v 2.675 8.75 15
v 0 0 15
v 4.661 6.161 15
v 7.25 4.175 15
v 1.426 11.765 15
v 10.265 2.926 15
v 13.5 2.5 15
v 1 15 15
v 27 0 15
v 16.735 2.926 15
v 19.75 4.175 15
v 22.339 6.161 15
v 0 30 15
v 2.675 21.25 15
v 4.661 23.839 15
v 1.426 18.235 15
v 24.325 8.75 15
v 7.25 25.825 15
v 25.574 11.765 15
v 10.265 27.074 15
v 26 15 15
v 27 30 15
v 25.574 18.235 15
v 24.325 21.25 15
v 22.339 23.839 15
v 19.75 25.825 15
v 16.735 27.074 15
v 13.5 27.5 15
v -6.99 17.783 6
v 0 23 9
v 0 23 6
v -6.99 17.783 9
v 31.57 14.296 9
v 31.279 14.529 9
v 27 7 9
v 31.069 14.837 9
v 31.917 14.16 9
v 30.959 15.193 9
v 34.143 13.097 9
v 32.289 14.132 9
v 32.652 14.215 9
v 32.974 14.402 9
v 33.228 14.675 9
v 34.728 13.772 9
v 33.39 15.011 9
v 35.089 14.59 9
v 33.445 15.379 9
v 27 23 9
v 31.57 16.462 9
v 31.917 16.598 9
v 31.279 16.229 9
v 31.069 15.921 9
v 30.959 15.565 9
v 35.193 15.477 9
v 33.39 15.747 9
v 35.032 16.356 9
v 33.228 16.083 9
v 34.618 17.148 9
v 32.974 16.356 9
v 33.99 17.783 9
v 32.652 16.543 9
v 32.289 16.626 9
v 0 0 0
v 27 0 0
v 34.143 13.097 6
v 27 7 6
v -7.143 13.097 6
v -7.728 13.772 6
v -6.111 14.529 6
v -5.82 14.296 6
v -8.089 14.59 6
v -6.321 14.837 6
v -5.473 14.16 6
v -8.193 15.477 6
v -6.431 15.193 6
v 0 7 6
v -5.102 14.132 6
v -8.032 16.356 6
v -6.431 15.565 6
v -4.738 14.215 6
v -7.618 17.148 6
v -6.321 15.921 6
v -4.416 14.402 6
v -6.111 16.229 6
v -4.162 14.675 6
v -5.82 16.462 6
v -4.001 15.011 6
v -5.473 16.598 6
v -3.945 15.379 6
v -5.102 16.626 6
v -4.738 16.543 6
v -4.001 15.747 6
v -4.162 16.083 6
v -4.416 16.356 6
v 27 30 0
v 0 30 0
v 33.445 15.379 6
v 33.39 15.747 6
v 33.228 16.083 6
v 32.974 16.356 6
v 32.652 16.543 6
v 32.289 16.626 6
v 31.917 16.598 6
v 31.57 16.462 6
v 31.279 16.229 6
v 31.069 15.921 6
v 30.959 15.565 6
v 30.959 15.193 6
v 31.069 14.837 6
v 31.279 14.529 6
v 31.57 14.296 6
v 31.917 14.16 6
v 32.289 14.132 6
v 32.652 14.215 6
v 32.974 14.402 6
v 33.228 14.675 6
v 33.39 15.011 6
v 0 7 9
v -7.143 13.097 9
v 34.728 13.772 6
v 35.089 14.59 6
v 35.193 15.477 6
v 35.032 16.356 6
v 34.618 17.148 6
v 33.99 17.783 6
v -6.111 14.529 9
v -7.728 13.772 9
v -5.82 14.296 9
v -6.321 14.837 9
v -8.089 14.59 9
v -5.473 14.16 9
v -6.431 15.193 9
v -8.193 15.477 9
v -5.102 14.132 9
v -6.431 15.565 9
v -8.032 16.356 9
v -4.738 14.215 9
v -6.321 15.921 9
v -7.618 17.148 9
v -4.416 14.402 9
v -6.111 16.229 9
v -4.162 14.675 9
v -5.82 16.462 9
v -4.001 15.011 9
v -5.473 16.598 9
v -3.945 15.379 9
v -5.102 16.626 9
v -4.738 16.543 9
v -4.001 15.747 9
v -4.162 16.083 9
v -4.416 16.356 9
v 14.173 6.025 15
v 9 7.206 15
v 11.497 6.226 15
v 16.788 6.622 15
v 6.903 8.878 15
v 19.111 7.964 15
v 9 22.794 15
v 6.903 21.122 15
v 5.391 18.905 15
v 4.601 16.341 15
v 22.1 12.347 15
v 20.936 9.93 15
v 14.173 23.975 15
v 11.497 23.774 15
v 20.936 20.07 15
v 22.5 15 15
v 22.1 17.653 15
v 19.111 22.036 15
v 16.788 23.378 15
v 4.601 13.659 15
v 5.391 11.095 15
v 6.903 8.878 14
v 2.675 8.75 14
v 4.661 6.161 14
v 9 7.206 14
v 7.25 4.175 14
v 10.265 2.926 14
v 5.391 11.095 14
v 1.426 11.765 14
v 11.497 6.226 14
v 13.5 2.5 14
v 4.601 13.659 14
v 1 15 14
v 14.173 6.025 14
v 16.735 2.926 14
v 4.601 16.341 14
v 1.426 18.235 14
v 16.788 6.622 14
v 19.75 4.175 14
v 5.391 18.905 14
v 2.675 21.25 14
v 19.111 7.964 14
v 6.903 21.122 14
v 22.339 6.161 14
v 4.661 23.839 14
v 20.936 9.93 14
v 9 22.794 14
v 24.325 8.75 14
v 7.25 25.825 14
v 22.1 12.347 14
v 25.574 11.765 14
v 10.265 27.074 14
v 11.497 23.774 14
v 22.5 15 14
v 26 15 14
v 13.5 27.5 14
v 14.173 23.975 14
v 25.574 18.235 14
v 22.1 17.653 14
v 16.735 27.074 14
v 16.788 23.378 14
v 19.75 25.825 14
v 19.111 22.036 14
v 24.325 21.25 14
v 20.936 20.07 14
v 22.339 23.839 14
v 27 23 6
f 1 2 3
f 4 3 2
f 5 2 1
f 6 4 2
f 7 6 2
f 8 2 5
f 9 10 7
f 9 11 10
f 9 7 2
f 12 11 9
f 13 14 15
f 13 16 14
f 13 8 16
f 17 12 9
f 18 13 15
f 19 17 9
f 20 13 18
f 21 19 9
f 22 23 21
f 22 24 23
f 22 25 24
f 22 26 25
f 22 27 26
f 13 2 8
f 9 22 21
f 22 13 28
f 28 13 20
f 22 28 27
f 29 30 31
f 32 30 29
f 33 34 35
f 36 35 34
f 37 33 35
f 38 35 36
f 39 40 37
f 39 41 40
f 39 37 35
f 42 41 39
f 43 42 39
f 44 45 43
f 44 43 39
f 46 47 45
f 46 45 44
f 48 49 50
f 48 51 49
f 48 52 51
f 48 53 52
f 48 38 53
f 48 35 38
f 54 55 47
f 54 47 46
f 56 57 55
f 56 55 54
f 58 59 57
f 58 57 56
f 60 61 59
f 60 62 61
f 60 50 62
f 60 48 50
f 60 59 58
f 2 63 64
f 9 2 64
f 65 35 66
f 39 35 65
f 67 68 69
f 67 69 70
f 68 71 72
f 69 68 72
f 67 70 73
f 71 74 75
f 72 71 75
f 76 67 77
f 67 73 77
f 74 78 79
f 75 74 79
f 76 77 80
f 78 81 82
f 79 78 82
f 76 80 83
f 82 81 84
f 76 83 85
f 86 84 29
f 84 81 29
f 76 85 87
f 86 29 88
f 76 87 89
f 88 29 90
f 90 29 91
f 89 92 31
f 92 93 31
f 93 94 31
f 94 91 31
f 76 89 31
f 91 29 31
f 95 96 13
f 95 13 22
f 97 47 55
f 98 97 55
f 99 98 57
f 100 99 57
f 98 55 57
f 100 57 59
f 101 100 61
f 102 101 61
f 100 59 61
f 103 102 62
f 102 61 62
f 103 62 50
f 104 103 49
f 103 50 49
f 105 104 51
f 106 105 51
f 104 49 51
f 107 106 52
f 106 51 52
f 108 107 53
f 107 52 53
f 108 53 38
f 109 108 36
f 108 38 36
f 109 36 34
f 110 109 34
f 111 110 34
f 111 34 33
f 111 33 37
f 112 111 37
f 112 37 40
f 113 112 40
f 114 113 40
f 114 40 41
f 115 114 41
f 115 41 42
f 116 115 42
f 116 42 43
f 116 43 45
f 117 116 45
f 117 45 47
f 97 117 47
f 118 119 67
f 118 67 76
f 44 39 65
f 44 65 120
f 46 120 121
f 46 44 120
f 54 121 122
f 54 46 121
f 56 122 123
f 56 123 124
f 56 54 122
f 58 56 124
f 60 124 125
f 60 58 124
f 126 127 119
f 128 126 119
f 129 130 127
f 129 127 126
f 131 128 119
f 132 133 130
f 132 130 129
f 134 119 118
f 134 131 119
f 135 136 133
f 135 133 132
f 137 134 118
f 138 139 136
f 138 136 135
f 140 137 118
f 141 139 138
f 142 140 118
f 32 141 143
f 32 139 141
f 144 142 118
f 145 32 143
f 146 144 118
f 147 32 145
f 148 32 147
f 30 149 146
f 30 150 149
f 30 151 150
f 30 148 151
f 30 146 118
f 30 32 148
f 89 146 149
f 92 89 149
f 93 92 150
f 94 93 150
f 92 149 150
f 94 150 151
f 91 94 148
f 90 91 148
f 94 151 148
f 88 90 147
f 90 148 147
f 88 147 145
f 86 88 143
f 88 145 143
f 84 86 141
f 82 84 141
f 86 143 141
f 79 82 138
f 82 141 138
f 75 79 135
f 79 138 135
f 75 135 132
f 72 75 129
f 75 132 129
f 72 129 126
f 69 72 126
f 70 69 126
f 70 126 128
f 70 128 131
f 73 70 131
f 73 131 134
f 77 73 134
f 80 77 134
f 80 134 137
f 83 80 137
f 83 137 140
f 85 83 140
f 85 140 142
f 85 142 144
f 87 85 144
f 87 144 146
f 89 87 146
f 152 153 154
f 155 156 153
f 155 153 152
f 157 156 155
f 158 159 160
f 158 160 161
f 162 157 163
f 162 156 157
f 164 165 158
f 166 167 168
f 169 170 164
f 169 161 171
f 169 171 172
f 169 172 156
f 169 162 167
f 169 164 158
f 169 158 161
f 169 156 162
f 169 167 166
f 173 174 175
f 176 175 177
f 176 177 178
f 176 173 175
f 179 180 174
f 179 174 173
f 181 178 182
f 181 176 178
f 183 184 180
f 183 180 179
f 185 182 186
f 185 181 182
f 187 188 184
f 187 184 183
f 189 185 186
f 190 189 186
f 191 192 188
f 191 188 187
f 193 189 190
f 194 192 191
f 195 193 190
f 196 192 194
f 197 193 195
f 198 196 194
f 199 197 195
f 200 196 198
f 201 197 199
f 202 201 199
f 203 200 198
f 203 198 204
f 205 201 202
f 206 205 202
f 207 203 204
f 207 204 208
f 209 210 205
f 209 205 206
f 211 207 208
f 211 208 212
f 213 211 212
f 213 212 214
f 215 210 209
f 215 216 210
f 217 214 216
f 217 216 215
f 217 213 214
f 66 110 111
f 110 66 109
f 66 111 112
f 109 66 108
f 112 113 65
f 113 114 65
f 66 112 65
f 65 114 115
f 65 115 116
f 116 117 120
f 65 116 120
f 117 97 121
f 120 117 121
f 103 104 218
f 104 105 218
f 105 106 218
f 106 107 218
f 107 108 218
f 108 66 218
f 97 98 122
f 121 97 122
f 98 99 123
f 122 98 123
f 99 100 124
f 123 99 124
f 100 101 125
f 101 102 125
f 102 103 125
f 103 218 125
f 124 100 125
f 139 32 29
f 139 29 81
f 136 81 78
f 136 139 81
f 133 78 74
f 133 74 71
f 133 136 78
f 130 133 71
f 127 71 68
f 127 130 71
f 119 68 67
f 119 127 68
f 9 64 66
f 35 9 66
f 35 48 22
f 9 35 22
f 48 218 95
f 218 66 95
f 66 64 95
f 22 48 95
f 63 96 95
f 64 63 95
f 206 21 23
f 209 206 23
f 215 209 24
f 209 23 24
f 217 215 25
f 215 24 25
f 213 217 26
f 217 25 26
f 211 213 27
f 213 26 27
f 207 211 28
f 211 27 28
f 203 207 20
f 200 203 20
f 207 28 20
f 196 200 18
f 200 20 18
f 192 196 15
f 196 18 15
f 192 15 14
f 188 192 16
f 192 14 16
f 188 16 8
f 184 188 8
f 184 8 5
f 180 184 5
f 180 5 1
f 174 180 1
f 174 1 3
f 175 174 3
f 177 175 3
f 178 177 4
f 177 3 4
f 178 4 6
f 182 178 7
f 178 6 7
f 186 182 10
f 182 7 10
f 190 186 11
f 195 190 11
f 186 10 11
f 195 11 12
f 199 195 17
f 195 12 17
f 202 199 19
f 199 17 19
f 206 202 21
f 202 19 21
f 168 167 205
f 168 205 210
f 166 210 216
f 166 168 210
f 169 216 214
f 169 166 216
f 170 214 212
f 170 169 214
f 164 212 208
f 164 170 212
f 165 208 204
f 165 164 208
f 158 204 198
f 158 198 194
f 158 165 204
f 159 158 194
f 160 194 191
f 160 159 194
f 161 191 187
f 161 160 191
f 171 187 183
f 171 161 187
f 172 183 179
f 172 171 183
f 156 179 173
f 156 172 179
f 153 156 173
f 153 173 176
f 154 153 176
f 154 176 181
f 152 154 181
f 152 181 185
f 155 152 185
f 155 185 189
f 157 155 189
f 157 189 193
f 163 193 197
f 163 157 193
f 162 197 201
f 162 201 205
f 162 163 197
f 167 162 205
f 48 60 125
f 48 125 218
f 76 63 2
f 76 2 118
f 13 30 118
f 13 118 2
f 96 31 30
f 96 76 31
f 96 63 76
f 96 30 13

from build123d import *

# Parameters (mm, degrees)
SKETCH1_W           = 27
SKETCH1_H           = 30
BOSS_EXTRUDE1_DEPTH = 15
SKETCH2_R           = 12.5
SKETCH2_R_2         = 9
CUT_EXTRUDE1_DEPTH  = 1
SKETCH3_R           = 1.25
BOSS_EXTRUDE2_DEPTH = 9
SKETCH4_W           = 10.736601318
SKETCH4_H           = 16
CUT_EXTRUDE2_DEPTH  = 6


with BuildPart() as part:
    # Sketch1 → Boss-Extrude1 (new body)
    with BuildSketch(Plane.XY):
        with Locations((13.5, 15)):
            Rectangle(SKETCH1_W, SKETCH1_H)
    extrude(amount=BOSS_EXTRUDE1_DEPTH)

    # Sketch2 → Cut-Extrude1 (cut)
    with BuildSketch(Plane.XY.offset(15)):
        with Locations((13.5, 15)):
            Circle(SKETCH2_R)
        with Locations((13.5, 15)):
            Circle(SKETCH2_R_2, mode=Mode.SUBTRACT)
    extrude(amount=-CUT_EXTRUDE1_DEPTH, mode=Mode.SUBTRACT)

    # Sketch3 → Boss-Extrude2 (add)
    # profile 1 of 2: a face of its own
    with BuildSketch(Plane.XY.offset(15)):
        with BuildLine():
            Line((0, 7), (0, 23))
            Line((0, 23), (-6.989512345, 17.783175422))
            ThreePointArc((-6.989512345, 17.783175422), (-8.193484437, 15.477105093), (-7.142826585, 13.097267443))
            Line((-7.142826585, 13.097267443), (0, 7))
        make_face()
        with Locations((-5.195088865, 15.379003137)):
            Circle(SKETCH3_R, mode=Mode.SUBTRACT)
    # profile 2 of 2: a face of its own
    with BuildSketch(Plane.XY.offset(15)):
        with BuildLine():
            Line((27, 7), (34.142826585, 13.097267443))
            ThreePointArc((34.142826585, 13.097267443), (35.193484437, 15.477105093), (33.989512345, 17.783175422))
            Line((33.989512345, 17.783175422), (27, 23))
            Line((27, 23), (27, 7))
        make_face()
        with Locations((32.195088865, 15.379003137)):
            Circle(SKETCH3_R, mode=Mode.SUBTRACT)
    extrude(amount=-BOSS_EXTRUDE2_DEPTH)

    # Sketch4 → Cut-Extrude2 (cut)
    with BuildSketch(Plane.XY.offset(15)):
        Polygon((0, 23), (-13.068539103, 23), (-13.068539103, 5.328314146), (0, 7), align=None)
        with Locations((32.368300659, 15)):
            Rectangle(SKETCH4_W, SKETCH4_H)
    extrude(amount=-CUT_EXTRUDE2_DEPTH, mode=Mode.SUBTRACT)


solid = part.part
